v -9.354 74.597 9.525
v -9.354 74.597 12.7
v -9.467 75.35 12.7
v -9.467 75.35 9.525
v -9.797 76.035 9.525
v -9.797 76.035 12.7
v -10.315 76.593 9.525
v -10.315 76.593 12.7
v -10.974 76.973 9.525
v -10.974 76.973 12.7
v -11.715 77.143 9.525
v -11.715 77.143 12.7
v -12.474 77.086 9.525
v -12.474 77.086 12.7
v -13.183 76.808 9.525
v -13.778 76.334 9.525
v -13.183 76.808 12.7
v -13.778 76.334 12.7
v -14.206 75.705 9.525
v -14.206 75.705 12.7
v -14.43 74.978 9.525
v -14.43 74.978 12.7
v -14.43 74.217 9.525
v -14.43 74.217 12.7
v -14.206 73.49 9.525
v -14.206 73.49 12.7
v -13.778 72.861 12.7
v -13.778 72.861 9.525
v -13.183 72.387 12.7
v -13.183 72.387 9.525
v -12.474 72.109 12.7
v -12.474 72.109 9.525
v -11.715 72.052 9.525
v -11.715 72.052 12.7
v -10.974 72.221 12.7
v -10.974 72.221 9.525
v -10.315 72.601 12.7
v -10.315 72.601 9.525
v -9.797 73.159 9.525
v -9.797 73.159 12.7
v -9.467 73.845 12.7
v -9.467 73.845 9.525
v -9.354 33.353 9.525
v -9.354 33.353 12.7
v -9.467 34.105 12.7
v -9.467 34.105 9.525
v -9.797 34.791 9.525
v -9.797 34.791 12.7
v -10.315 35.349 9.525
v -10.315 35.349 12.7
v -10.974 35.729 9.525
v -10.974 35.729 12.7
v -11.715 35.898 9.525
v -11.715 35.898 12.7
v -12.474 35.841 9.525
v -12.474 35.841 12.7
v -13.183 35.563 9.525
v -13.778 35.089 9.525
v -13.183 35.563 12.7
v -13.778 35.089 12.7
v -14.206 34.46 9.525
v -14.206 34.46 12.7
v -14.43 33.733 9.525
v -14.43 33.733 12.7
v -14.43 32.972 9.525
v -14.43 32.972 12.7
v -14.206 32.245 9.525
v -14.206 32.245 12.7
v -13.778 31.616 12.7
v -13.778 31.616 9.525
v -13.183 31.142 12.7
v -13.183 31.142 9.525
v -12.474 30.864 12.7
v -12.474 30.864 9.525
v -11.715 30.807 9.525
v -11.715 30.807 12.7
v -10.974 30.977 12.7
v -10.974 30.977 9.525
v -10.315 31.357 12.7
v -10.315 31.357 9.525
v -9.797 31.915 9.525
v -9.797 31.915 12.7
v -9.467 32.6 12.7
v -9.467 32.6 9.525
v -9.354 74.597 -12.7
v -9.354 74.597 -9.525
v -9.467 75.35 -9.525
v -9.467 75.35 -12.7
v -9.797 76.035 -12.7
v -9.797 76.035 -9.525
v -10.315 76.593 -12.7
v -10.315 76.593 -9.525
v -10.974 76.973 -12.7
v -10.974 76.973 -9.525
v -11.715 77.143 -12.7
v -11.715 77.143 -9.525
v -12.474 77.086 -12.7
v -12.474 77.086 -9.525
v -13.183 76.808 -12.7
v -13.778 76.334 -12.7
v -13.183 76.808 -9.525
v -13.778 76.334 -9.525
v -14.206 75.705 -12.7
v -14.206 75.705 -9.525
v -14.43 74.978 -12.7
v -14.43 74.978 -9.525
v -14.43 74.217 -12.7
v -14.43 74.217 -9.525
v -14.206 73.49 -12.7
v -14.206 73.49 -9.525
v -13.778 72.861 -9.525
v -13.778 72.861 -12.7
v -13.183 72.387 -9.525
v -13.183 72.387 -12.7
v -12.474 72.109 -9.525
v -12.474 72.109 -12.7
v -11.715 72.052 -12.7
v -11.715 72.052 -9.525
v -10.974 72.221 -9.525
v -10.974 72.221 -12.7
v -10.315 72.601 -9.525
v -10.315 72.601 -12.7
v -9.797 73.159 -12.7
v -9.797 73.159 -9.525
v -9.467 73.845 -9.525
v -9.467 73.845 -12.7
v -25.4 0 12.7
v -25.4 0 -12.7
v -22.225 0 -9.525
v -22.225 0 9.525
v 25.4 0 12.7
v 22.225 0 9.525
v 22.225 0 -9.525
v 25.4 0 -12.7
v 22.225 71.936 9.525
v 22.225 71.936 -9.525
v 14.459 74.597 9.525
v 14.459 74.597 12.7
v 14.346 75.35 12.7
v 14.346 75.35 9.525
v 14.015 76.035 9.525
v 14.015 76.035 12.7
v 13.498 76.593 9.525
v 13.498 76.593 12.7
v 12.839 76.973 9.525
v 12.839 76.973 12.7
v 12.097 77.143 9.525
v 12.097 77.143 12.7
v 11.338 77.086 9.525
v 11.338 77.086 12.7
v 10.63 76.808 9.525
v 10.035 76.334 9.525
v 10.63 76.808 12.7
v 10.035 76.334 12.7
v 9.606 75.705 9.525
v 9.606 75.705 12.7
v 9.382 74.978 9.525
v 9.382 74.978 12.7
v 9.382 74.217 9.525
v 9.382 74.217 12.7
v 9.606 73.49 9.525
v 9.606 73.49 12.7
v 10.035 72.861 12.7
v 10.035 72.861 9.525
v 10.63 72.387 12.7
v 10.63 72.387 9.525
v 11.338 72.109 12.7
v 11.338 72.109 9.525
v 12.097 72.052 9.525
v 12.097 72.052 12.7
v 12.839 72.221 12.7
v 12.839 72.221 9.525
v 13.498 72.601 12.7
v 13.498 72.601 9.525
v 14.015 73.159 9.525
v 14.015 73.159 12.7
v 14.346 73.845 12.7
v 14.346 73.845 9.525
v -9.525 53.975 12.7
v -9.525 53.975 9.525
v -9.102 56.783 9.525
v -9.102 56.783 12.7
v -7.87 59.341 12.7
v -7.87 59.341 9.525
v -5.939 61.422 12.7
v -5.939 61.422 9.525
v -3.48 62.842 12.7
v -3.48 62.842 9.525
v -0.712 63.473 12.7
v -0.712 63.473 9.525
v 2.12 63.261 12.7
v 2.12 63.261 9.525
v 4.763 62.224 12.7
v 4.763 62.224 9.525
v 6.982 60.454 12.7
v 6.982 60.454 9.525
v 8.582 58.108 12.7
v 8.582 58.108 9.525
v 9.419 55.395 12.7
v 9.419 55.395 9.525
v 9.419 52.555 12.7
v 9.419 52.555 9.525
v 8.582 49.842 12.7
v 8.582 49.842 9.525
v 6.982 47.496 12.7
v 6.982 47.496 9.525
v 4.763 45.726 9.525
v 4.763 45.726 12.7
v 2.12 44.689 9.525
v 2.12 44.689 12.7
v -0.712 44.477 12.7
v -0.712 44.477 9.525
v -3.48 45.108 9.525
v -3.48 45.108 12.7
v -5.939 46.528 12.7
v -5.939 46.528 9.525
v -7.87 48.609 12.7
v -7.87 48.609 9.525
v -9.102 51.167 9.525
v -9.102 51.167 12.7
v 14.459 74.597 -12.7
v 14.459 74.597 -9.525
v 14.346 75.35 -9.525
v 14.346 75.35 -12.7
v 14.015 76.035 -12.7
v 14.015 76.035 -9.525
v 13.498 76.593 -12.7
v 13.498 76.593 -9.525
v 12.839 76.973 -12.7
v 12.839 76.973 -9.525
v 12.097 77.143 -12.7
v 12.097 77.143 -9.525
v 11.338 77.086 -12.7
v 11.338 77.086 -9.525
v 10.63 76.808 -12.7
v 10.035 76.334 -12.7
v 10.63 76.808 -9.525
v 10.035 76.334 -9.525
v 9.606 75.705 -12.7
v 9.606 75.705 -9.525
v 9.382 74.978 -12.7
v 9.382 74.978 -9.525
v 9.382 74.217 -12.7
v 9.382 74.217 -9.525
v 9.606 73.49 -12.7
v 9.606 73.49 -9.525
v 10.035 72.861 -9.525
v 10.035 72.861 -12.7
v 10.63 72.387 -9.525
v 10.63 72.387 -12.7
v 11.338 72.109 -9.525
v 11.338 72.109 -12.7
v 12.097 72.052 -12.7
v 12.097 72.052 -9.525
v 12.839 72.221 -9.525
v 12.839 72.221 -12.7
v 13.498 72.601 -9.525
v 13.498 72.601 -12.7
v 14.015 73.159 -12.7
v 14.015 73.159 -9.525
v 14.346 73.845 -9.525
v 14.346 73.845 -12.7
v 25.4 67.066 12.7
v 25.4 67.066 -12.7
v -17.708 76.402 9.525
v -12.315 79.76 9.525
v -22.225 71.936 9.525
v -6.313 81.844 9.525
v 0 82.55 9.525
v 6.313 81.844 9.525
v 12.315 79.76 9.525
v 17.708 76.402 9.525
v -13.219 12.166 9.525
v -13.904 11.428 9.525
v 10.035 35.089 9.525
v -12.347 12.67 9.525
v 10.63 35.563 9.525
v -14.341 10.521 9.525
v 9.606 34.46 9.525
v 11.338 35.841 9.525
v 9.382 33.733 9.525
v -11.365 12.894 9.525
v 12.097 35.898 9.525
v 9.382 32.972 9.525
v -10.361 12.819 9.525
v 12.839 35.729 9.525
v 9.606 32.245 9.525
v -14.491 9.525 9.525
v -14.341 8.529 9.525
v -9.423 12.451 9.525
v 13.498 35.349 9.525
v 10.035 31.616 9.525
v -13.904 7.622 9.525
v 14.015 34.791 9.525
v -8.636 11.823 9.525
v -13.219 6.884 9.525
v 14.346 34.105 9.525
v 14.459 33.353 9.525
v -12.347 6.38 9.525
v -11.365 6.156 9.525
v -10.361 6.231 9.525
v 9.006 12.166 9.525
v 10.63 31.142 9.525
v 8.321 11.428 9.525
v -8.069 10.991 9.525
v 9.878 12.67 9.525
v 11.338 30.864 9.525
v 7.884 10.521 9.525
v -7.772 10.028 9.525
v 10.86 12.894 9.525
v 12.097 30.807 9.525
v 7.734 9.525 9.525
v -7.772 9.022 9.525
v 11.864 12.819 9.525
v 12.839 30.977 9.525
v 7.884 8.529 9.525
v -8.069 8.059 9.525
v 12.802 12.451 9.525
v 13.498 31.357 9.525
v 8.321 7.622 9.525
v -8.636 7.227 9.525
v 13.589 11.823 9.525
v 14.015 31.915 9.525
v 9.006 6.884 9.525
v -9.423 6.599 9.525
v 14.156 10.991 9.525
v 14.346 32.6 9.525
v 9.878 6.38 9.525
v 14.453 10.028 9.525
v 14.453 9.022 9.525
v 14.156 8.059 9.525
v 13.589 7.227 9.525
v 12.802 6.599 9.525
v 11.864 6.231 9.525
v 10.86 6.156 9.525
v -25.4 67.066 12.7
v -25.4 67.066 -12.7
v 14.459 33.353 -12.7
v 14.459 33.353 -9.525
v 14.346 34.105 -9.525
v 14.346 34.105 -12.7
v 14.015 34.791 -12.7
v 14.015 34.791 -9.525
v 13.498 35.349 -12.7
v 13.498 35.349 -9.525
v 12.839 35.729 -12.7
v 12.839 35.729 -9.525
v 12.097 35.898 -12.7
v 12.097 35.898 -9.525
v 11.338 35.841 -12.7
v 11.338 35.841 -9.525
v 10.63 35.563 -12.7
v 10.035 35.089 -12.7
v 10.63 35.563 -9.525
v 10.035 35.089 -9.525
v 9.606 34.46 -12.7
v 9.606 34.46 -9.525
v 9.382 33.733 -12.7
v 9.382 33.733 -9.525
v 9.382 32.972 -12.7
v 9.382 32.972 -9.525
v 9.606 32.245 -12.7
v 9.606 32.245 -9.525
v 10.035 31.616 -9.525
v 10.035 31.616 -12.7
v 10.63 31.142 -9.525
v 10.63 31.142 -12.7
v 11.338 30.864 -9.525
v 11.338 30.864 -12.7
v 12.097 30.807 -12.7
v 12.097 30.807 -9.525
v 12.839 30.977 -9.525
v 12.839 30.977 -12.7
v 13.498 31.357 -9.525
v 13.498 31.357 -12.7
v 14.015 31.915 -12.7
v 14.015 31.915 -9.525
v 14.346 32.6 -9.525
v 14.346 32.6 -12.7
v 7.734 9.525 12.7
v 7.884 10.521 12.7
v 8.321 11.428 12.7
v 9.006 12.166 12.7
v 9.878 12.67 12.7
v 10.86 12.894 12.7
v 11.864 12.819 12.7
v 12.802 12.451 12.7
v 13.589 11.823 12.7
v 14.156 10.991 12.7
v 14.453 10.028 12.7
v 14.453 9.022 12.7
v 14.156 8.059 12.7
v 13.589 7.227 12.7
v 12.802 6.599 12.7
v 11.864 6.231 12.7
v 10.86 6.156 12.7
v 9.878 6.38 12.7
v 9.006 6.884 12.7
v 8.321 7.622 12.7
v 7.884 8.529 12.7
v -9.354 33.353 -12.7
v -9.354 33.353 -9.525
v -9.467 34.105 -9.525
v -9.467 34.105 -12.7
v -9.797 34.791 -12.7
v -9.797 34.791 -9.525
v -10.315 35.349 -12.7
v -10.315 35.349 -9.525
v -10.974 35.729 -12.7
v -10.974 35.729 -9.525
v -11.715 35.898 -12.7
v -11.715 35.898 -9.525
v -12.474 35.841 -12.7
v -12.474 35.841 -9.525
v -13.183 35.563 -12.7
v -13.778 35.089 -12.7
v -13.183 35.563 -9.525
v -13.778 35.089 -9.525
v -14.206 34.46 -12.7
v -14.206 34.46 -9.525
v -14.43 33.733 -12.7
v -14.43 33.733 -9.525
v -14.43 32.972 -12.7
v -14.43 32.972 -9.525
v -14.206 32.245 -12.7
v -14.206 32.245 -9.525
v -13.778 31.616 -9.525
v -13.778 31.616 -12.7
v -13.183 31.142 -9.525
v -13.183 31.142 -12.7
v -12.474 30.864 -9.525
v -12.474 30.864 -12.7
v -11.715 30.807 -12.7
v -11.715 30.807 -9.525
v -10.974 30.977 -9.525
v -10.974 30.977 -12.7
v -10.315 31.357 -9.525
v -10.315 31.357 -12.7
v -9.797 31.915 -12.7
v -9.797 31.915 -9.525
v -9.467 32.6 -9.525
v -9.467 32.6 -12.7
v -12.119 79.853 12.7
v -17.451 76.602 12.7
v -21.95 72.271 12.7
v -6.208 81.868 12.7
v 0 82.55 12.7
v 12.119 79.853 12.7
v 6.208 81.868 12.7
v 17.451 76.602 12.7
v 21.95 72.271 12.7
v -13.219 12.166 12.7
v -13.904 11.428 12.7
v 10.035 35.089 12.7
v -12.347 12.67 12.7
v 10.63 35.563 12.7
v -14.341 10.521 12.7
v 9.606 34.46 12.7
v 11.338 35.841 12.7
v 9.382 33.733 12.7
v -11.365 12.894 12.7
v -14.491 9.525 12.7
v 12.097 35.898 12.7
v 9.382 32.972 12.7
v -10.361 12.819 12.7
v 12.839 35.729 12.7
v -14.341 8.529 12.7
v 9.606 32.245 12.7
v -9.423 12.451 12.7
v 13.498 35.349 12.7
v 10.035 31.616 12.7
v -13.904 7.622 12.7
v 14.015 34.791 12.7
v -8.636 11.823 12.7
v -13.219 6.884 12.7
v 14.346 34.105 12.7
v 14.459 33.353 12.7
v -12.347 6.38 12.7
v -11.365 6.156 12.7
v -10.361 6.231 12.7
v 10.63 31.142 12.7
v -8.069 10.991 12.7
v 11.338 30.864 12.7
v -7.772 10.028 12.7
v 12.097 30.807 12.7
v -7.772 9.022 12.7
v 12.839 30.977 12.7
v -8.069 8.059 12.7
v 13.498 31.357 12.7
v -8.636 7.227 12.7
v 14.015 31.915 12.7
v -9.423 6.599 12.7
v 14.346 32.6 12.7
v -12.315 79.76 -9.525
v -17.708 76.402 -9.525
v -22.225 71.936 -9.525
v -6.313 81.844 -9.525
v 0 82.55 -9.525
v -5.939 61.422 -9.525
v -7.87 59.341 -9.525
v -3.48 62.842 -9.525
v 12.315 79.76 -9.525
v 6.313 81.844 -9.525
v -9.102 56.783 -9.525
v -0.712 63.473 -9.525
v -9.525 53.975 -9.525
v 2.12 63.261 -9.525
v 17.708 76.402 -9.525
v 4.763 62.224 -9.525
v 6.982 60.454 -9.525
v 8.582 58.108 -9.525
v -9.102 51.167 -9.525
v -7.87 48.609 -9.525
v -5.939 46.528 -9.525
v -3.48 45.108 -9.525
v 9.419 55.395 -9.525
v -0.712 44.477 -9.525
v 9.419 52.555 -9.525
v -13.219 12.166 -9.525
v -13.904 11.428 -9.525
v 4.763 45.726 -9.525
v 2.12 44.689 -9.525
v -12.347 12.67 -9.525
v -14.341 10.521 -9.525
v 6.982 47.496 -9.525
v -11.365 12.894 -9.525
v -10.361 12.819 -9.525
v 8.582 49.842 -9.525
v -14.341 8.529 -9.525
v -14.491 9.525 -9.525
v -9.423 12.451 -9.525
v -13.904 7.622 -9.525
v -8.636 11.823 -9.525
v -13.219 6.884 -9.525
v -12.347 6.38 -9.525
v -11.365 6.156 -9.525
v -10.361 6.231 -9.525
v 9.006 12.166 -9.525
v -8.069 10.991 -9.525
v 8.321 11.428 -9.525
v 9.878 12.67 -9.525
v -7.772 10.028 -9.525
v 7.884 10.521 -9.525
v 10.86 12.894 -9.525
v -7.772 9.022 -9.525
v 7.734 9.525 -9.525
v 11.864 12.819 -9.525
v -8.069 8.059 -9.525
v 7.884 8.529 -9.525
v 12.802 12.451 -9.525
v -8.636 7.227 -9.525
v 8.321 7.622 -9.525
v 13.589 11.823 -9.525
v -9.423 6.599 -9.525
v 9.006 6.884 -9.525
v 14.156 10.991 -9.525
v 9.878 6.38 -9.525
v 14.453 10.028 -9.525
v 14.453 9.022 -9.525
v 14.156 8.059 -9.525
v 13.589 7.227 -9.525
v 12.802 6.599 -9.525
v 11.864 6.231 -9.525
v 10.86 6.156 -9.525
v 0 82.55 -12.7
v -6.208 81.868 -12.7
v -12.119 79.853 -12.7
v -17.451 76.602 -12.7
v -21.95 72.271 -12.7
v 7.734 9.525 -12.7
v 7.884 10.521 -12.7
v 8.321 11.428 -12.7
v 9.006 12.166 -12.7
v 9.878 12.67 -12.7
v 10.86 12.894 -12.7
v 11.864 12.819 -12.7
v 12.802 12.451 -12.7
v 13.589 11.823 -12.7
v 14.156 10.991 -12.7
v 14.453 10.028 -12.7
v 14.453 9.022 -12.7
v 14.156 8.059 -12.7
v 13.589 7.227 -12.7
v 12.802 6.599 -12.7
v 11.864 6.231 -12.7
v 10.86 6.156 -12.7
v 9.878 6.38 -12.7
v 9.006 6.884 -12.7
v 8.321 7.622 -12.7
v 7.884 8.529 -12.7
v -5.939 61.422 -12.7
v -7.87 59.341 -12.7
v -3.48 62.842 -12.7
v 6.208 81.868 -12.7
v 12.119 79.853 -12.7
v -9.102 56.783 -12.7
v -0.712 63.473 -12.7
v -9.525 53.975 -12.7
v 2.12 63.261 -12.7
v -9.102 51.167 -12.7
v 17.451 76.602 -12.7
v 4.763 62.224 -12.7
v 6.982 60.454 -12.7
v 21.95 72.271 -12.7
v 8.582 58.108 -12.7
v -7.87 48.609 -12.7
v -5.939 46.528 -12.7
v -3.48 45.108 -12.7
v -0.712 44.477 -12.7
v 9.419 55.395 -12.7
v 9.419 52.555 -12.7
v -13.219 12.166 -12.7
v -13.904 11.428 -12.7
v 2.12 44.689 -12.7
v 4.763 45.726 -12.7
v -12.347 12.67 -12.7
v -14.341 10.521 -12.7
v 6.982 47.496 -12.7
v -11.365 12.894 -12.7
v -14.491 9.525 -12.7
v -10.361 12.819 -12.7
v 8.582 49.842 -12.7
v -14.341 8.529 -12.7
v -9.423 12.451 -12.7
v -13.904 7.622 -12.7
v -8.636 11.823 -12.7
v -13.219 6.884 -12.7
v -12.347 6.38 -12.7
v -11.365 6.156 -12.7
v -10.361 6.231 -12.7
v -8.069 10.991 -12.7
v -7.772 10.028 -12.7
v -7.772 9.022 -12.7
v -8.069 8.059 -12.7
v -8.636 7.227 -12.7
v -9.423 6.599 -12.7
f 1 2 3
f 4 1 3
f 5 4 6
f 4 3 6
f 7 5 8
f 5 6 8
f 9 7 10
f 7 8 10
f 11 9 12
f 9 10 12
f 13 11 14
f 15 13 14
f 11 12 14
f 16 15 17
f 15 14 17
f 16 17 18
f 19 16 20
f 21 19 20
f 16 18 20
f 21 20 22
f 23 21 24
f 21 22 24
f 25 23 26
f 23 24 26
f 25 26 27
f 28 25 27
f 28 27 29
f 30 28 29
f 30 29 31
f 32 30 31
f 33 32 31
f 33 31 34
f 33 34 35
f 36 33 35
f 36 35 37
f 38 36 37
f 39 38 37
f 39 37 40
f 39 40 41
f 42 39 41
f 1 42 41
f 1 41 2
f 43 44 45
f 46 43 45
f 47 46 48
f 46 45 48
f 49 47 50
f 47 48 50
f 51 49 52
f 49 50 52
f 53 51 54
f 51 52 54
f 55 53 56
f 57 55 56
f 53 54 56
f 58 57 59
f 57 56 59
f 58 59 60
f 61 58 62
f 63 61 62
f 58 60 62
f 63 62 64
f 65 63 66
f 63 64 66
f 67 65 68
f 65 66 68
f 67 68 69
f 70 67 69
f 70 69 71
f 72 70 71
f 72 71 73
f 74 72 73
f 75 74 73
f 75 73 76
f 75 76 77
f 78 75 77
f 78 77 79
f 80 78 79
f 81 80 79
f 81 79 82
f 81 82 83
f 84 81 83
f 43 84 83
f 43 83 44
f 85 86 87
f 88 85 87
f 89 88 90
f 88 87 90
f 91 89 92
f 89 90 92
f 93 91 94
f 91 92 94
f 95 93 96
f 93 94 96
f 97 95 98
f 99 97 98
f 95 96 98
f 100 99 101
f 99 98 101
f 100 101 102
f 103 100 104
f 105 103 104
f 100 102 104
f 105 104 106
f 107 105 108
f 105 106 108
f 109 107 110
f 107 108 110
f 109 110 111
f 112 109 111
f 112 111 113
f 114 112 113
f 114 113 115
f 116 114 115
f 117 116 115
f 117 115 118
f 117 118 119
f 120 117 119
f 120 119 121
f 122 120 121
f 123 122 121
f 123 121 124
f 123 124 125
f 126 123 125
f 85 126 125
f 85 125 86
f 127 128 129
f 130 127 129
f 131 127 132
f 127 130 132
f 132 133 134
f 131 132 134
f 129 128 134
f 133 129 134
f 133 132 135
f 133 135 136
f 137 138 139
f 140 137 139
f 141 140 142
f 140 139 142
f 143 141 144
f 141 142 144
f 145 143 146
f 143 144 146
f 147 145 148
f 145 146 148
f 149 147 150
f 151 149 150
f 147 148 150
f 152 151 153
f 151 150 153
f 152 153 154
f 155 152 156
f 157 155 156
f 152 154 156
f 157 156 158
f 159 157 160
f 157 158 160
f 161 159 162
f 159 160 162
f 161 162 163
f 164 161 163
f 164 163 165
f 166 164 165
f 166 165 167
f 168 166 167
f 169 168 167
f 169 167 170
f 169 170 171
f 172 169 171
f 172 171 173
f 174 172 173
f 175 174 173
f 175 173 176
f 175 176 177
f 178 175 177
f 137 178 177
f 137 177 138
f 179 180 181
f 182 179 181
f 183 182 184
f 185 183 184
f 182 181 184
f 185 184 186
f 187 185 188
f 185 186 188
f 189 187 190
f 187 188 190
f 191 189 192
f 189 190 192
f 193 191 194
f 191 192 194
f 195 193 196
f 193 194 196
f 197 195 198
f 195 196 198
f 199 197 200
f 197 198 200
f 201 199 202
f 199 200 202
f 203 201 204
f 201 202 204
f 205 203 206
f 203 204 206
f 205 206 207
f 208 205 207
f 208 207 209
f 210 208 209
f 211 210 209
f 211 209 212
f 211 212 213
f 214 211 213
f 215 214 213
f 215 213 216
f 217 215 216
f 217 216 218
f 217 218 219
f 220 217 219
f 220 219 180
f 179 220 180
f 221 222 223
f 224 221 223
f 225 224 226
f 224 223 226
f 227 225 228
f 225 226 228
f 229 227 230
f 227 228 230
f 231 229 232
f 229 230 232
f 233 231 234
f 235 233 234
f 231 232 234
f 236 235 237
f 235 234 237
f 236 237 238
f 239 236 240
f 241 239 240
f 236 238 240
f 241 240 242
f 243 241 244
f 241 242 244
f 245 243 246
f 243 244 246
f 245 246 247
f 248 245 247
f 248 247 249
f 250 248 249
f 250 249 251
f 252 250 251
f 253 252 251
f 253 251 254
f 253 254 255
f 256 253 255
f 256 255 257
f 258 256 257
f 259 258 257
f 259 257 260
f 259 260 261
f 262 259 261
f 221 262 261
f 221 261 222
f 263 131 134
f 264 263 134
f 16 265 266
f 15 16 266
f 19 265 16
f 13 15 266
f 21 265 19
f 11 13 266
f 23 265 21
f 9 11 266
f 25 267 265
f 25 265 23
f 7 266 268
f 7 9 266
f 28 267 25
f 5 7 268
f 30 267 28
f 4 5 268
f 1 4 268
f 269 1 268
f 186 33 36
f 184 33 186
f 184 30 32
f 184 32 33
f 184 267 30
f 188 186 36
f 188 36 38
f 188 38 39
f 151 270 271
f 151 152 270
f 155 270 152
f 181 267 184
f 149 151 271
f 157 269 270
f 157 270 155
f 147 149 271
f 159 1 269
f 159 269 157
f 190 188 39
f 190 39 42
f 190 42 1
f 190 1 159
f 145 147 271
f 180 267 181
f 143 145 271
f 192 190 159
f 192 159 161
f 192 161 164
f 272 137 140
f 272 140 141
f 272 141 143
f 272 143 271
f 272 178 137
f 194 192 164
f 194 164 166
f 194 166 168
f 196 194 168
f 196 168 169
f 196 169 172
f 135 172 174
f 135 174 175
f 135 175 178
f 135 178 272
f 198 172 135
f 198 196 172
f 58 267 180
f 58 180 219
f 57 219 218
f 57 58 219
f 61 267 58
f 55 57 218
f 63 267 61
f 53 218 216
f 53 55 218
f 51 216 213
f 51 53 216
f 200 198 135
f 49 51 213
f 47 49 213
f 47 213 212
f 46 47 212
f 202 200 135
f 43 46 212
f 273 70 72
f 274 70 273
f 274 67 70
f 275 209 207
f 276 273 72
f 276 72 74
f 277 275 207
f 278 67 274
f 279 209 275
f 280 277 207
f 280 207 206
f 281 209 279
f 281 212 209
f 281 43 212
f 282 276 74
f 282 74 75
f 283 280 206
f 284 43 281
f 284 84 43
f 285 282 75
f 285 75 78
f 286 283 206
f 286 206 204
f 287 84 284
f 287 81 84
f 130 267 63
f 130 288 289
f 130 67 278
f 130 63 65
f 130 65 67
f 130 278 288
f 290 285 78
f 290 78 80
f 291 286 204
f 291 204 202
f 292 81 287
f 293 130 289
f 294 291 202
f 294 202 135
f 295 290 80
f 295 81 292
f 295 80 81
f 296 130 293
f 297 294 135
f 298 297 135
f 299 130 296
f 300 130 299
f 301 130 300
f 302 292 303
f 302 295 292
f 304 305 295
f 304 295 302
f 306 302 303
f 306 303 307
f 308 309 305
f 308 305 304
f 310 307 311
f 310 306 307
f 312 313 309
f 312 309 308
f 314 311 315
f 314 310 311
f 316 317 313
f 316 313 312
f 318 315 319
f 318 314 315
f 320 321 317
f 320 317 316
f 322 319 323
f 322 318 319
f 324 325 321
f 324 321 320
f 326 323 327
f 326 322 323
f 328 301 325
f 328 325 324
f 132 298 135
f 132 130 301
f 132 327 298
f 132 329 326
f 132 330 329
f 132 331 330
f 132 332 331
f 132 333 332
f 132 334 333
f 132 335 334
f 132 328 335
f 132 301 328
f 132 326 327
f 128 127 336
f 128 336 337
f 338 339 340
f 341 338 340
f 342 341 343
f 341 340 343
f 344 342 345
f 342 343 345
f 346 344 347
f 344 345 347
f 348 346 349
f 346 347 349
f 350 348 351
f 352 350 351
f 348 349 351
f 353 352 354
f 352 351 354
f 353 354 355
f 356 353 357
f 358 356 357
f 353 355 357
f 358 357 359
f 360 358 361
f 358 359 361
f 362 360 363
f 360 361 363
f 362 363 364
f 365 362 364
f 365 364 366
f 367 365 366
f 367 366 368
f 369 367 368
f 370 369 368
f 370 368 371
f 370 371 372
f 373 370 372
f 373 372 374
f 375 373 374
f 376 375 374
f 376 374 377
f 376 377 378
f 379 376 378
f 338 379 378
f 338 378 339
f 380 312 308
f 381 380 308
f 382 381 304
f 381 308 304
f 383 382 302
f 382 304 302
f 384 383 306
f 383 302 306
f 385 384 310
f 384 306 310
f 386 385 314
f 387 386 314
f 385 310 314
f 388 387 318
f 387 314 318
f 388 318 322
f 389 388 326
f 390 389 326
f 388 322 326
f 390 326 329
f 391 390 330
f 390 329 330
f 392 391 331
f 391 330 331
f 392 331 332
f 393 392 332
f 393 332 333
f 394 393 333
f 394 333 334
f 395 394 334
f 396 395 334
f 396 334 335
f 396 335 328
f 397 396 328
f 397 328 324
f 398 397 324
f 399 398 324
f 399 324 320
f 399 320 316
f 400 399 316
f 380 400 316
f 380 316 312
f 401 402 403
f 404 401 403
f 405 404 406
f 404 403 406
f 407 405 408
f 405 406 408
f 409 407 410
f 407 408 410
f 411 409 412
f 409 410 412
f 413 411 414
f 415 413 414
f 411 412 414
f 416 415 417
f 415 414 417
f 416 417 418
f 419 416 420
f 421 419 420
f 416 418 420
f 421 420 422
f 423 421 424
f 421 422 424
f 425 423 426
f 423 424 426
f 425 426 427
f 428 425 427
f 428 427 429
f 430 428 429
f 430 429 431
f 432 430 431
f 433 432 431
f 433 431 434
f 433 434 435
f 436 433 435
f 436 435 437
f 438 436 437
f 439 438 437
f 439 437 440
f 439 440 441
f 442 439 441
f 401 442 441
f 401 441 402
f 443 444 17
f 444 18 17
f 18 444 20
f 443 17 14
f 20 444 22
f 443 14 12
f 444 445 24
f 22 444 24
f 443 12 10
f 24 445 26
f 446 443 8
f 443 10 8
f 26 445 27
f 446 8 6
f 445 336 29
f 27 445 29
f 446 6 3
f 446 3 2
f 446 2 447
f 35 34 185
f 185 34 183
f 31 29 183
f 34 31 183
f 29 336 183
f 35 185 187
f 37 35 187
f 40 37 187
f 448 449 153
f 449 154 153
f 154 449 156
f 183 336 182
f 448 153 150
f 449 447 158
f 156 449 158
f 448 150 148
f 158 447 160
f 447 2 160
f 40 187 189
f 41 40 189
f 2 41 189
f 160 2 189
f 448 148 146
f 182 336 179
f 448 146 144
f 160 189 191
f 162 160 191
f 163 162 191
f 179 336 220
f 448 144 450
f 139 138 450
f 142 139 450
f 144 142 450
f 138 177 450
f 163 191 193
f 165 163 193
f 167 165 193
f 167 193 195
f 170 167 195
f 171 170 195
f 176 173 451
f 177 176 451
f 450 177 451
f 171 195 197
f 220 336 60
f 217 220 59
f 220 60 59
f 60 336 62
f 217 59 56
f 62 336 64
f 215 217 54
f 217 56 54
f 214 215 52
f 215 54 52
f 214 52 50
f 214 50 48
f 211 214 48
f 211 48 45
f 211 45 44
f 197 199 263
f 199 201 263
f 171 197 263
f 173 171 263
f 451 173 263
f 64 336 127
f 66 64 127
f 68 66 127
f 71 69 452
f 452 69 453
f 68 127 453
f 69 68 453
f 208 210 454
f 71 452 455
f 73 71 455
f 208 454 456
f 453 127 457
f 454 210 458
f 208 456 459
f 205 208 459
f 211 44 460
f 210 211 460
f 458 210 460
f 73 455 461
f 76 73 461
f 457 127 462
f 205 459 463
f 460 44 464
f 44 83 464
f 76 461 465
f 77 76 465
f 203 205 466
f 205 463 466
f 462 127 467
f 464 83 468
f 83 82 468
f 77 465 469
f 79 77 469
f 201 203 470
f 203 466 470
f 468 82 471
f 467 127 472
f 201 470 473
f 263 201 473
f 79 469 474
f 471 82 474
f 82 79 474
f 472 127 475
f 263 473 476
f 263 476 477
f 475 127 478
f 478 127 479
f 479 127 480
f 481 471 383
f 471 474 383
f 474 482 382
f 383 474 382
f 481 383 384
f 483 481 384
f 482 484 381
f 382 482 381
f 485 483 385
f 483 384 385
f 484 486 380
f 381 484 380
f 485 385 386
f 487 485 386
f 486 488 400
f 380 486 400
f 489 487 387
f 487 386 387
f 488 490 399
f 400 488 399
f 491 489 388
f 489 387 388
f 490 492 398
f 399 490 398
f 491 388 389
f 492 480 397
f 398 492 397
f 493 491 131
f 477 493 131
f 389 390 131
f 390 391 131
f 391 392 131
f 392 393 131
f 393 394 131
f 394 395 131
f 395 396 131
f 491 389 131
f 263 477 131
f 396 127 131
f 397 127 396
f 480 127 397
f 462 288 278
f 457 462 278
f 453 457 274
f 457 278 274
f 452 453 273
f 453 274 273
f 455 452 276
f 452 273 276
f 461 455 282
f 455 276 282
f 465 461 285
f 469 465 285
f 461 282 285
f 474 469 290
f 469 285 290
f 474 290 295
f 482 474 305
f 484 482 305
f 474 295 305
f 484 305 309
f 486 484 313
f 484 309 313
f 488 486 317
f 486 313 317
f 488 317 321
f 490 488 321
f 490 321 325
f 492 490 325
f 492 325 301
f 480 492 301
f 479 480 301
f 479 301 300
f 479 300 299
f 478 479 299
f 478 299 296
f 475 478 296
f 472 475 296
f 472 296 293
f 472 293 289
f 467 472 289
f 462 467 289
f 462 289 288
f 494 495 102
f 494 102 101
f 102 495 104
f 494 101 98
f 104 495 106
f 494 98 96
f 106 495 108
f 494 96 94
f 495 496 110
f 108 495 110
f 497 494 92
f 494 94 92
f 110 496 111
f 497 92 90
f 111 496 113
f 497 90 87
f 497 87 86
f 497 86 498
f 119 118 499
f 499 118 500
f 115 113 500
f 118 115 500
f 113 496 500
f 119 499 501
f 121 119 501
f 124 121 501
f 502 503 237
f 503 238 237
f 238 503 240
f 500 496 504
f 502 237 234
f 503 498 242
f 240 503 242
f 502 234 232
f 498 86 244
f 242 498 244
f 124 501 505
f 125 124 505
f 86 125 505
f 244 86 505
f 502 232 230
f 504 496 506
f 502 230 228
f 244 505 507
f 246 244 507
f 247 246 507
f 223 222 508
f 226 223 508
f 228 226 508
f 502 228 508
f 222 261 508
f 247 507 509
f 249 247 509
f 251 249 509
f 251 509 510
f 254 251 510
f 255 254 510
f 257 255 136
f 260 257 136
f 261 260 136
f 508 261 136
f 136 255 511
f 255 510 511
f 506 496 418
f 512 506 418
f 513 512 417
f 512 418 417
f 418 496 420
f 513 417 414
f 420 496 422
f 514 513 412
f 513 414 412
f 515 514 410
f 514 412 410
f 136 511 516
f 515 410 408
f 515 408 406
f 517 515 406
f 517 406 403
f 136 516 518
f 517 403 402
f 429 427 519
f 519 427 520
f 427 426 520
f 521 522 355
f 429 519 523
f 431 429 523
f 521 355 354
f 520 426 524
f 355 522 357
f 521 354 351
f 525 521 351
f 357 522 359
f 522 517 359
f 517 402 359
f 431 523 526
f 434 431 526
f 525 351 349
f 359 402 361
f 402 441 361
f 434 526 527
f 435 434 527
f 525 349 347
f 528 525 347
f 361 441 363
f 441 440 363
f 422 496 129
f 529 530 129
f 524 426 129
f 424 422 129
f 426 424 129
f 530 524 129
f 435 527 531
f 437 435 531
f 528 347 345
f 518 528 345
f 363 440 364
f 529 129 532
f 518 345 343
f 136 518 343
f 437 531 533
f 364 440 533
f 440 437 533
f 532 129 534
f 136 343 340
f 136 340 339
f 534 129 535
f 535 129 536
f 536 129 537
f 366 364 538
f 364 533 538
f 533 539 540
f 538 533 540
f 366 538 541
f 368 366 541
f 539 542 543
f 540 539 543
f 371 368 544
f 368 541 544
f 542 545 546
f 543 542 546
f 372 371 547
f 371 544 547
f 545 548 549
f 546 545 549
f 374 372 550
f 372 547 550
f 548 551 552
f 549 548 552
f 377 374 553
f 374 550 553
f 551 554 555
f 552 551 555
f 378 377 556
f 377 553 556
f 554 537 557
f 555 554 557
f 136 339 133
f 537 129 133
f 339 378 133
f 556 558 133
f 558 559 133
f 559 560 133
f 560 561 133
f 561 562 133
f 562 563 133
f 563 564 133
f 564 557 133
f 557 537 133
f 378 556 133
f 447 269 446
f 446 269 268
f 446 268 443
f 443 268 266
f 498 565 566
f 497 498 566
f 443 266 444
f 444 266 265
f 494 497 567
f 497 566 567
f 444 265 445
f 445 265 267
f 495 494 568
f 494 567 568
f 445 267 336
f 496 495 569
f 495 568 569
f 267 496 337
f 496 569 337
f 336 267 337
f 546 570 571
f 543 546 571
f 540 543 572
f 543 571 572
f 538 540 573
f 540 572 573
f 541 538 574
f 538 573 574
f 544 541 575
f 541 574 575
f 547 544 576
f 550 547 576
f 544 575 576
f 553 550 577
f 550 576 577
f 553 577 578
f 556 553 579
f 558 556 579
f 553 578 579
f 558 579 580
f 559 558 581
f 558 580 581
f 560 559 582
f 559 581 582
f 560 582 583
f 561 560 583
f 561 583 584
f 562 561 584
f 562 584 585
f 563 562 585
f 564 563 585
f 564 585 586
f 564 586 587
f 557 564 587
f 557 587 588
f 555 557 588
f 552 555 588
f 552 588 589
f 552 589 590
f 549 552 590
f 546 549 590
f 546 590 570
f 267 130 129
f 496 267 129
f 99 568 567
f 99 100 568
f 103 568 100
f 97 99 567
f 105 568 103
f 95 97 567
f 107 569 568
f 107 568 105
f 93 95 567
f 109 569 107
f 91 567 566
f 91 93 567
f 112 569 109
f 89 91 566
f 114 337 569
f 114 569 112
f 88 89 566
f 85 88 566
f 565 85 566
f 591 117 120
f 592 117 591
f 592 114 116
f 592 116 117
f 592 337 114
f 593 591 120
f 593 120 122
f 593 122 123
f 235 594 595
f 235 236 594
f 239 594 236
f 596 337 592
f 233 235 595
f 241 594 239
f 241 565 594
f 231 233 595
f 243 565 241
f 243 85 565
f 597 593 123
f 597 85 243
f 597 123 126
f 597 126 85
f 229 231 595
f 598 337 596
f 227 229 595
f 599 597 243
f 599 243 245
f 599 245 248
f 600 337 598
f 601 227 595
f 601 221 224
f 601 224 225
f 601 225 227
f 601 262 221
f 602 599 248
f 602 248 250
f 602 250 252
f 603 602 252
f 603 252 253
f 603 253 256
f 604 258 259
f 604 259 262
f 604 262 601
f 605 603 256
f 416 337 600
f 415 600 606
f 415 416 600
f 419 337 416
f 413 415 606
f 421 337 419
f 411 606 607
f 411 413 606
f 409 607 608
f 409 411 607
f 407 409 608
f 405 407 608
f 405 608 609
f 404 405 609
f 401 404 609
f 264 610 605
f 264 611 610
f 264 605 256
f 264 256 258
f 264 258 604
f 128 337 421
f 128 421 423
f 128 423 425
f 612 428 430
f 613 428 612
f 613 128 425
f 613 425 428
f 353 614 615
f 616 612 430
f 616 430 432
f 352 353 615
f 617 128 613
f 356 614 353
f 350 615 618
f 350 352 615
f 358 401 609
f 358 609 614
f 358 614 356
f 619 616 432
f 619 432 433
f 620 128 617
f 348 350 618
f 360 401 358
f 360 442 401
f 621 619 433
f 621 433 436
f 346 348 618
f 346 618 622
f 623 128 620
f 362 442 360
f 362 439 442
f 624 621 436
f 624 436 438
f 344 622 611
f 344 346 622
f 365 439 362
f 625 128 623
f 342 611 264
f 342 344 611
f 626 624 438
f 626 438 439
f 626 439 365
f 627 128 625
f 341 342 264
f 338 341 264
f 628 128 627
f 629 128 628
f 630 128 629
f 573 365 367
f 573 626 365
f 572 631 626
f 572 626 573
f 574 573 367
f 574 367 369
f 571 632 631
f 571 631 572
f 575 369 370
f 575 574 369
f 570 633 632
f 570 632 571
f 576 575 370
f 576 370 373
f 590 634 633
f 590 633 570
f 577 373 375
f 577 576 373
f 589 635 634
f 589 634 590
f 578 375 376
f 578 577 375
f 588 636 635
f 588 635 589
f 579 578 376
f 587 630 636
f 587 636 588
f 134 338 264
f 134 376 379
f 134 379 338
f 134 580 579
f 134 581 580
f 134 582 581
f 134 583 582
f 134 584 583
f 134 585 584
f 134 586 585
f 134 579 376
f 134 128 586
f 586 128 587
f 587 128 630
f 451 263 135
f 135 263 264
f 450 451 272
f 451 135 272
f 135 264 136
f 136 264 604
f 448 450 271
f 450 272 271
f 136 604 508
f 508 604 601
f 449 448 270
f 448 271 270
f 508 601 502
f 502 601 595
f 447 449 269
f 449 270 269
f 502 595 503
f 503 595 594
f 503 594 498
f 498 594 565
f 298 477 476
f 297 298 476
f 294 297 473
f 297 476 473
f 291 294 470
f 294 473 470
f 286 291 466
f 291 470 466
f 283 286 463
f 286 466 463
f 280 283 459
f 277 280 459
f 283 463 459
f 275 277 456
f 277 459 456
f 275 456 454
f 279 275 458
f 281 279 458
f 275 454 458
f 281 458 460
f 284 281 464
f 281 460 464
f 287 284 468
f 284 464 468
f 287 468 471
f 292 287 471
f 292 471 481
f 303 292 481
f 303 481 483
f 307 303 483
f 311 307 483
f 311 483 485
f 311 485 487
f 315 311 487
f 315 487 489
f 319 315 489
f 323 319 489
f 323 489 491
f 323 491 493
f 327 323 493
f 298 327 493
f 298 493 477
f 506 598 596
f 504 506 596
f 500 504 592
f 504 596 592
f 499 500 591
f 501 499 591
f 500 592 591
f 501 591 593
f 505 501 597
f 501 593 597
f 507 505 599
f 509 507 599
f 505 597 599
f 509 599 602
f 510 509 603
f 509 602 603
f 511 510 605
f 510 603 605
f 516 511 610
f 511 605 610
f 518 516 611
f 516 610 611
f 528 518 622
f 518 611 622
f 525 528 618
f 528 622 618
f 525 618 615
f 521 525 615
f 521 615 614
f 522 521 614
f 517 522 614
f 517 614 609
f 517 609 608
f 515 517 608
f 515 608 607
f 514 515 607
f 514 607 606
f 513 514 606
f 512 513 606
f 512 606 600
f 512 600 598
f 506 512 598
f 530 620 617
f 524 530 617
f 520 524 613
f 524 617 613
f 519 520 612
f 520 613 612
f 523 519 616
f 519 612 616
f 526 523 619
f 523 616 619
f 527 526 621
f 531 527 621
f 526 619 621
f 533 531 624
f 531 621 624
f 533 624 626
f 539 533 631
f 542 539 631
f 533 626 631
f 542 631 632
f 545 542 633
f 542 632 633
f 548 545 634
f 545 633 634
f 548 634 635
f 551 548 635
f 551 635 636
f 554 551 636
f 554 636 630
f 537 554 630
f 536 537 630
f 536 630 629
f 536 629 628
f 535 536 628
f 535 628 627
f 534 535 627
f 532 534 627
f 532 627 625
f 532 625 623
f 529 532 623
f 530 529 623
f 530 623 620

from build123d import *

# Parameters (mm, degrees)
SKETCH1_W               = 50.8
SKETCH1_H               = 25.4
SKETCH1_W_2             = 44.45
SKETCH1_H_2             = 19.05
EXTRUDE_THIN1_DEPTH     = 82.55
F_10_CLEARANCE_HOLE1_D  = 5.1054
SKETCH7_R               = 9.525
CUT_EXTRUDE2_DEPTH      = 1
CUT_EXTRUDE2_DEPTH_BACK = 26.4
F_1_4_CLEARANCE_HOLE2_D = 6.7564
CUT_EXTRUDE3_DEPTH      = 26.4


with BuildPart() as part:
    # Sketch1 → Extrude-Thin1 (new body)
    with BuildSketch(Plane(origin=(0, 0, 0), x_dir=(1, 0, 0), z_dir=(0, 1, 0))):
        Rectangle(SKETCH1_W, SKETCH1_H)
        Rectangle(SKETCH1_W_2, SKETCH1_H_2, mode=Mode.SUBTRACT)
    extrude(amount=EXTRUDE_THIN1_DEPTH)

    # #10 Clearance Hole1 (through all)
    with Locations(Plane(origin=(0, 0, -12.7), x_dir=(-1, 0, 0), z_dir=(0, 0, -1))):
        with Locations((-11.90625, 33.352770072), (-11.90625, 74.597229928), (11.90625, 74.597229928), (11.90625, 33.352770072)):
            Hole(F_10_CLEARANCE_HOLE1_D / 2)

    # Sketch7 → Cut-Extrude2 (cut, two sides)
    with BuildSketch(Plane(origin=(0, 0, -12.7), x_dir=(-1, 0, 0), z_dir=(0, 0, -1))) as cut_extrude2_sk:
        with Locations((0, 53.975)):
            Circle(SKETCH7_R)
    extrude(amount=CUT_EXTRUDE2_DEPTH, mode=Mode.SUBTRACT)
    extrude(cut_extrude2_sk.sketch, amount=-CUT_EXTRUDE2_DEPTH_BACK, mode=Mode.SUBTRACT)

    # 1/4 Clearance Hole2 (through all)
    with Locations(Plane.XY.offset(12.7)):
        with Locations((-11.1125, 9.525), (11.1125, 9.525), (-109.171479686, 68.785430569)):
            Hole(F_1_4_CLEARANCE_HOLE2_D / 2)

    # Sketch10 → Cut-Extrude3 (cut, through all)
    with BuildSketch(Plane(origin=(0, 0, -12.7), x_dir=(-1, 0, 0), z_dir=(0, 0, -1))):
        with BuildLine():
            Line((-25.4, 82.55), (-25.4, 67.065860361))
            ThreePointArc((-25.4, 67.065860361), (-14.873790542, 78.373790542), (0, 82.55))
            Line((0, 82.55), (-25.4, 82.55))
        make_face()
        with BuildLine():
            Line((25.4, 82.55), (0, 82.55))
            ThreePointArc((0, 82.55), (14.873790542, 78.373790542), (25.4, 67.065860361))
            Line((25.4, 67.065860361), (25.4, 82.55))
        make_face()
    extrude(amount=-CUT_EXTRUDE3_DEPTH, mode=Mode.SUBTRACT)


solid = part.part
